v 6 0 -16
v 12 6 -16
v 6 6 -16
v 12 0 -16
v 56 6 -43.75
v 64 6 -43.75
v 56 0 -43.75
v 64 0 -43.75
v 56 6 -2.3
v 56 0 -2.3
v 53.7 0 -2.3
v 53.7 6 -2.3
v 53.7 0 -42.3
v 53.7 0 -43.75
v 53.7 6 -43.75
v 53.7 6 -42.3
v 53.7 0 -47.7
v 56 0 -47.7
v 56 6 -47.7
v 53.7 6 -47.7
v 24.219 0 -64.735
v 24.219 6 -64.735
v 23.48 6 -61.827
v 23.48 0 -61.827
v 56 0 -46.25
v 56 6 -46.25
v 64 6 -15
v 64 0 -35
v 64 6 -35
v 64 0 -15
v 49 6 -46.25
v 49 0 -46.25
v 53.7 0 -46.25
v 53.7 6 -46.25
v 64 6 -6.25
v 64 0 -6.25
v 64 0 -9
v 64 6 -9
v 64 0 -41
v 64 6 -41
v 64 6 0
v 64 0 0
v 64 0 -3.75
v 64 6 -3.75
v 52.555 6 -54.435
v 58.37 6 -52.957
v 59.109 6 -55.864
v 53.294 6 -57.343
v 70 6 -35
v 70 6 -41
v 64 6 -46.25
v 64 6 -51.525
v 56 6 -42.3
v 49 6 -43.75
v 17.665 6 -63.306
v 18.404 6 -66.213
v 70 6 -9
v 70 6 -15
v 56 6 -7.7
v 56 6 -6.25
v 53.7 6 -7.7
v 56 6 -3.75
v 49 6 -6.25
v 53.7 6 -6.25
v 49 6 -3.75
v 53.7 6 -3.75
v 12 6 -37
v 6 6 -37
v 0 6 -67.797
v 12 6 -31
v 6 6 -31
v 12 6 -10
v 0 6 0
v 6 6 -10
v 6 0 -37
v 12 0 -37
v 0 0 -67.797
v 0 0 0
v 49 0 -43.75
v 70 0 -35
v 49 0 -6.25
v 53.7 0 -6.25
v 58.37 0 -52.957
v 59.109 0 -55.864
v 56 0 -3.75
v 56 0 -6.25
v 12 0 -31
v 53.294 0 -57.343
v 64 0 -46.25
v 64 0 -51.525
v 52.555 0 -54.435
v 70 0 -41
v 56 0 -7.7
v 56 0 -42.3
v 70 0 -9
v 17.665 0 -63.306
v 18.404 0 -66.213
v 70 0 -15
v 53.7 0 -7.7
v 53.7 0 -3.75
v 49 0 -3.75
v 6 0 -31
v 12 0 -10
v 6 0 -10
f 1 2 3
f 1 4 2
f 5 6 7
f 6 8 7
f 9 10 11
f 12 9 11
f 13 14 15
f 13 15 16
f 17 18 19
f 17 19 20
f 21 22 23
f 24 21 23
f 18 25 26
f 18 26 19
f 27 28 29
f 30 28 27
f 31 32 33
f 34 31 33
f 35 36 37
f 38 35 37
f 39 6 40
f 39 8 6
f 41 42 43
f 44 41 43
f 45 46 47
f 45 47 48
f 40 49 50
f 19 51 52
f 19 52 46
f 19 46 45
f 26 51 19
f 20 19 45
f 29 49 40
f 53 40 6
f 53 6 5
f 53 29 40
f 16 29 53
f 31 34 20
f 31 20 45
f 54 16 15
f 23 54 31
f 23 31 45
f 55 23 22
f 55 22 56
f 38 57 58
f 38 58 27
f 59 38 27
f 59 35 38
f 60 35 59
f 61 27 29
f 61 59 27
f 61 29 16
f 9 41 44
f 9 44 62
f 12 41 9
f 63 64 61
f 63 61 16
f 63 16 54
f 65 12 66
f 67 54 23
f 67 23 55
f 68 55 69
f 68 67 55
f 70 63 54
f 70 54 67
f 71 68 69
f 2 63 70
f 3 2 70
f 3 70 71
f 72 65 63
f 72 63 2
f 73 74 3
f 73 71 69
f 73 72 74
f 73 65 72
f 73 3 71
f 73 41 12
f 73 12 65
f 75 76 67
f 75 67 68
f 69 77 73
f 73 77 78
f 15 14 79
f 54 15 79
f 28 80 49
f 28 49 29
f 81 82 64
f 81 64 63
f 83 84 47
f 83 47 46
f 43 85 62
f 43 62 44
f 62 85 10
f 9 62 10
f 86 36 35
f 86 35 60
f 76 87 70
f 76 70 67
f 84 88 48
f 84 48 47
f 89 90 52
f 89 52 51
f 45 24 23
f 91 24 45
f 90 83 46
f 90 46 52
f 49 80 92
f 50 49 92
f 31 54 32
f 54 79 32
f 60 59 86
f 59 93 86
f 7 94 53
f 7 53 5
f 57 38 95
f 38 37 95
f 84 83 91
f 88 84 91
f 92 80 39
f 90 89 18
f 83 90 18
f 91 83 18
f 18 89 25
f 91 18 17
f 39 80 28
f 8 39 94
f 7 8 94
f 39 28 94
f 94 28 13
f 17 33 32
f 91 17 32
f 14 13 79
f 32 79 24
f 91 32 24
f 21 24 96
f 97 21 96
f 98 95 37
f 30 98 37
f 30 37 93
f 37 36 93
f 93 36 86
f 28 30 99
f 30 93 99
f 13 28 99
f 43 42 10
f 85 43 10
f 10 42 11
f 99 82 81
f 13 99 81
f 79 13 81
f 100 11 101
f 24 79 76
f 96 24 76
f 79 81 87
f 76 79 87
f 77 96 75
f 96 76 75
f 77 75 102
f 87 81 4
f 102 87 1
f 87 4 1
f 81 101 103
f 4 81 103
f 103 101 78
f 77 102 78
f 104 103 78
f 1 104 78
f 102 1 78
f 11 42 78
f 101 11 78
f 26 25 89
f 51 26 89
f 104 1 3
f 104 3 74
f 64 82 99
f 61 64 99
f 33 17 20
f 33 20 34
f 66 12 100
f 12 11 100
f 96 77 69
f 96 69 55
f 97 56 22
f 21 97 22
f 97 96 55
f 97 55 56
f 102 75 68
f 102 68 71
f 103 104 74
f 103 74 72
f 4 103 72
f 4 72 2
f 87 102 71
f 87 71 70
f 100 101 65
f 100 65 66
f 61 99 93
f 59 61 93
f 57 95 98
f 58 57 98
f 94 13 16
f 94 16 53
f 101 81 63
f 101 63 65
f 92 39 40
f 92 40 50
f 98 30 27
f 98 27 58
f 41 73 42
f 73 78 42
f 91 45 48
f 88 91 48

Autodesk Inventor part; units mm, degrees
ref_plane "YZ Plane" through (0, 0, 0) normal (1, 0, 0) x (0, 1, 0)
ref_plane "XZ Plane" through (0, 0, 0) normal (0, 1, 0) x (-1, 0, 0)
ref_plane "XY Plane" through (0, 0, 0) normal (0, 0, 1) x (1, 0, 0)
sketch "Sketch1" plane through (0, 0, 0) normal (0, 1, 0) x (-1, 0, 0)
  line L0 (0, 0) -> (-70, 0)
  line L1 (-70, 0) -> (-70, -50)
  line L2 (-70, -50) -> (0, -50)
  line L3 (0, -50) -> (0, 0)
  line L4 (0, -50) -> (0, -67.7966)
  line L5 (0, -67.7966) -> (-70, -50)
  dimension "d0" = 70
  dimension "d1" = 50
  dimension "d45" = 14.264
extrude "Extrusion1" add sketch "Sketch1" along normal blind 6
sketch "Sketch2" plane through (0, 6, 0) normal (0, 1, 0) x (1, 0, 0)
  line L0 (70, 50) -> (58.37, 52.9568) construction
  line L1 (70, 50) -> (0, 67.7966) construction
  line L2 (58.37, 52.9568) -> (52.555, 54.4352)
  line L3 (52.555, 54.4352) -> (53.2942, 57.3427)
  line L4 (53.2942, 57.3427) -> (59.1092, 55.8643)
  line L5 (59.1092, 55.8643) -> (58.37, 52.9568)
  line L6 (23.4799, 61.8271) -> (17.6649, 63.3055)
  line L7 (17.6649, 63.3055) -> (18.4041, 66.213)
  line L8 (18.4041, 66.213) -> (24.2191, 64.7346)
  line L9 (24.2191, 64.7346) -> (23.4799, 61.8271)
  point P0 (0, 0)
  dimension "d9" = 12
  dimension "d10" = 6
  dimension "d11" = 3
  dimension "d15" = 6
  dimension "d16" = 3
  dimension "d17" = 30
extrude "Extrusion2" add sketch "Sketch2" against normal blind 6
sketch "Sketch3" plane through (0, 6, 0) normal (0, 1, 0) x (1, 0, 0)
  line L0 (70, 0) -> (70, 50) projected
  line L1 (70, 54) -> (64, 54)
  line L2 (64, 54) -> (64, 41)
  line L3 (64, 41) -> (70, 41)
  line L4 (70, 41) -> (70, 54)
  line L5 (70, 0) -> (64, 0)
  line L6 (64, 0) -> (64, 9)
  line L7 (64, 9) -> (70, 9)
  line L8 (70, 9) -> (70, 0)
  line L9 (70, 35) -> (64, 35)
  line L10 (64, 35) -> (64, 15)
  line L11 (64, 15) -> (70, 15)
  line L12 (70, 15) -> (70, 35)
  point P0 (0, 0)
  dimension "d18" = 6
  dimension "d20" = 6
  dimension "d21" = 9
  dimension "d22" = 6
  dimension "d23" = 6
  dimension "d27" = 20
  dimension "d36" = 13
extrude "Extrusion3" cut sketch "Sketch3" along normal through all both and the other way through all
sketch "Sketch4" plane through (0, 6, 0) normal (0, 1, 0) x (1, 0, 0)
  line L0 (64, 0) -> (64, 9) projected
  line L1 (64, 6.25) -> (56, 6.25)
  line L2 (49, 6.25) -> (49, 3.75)
  line L3 (49, 3.75) -> (53.7, 3.75)
  line L4 (64, 3.75) -> (64, 6.25)
  line L5 (64, 9) -> (70, 9) projected
  line L6 (64, 43.75) -> (56, 43.75)
  line L7 (49, 43.75) -> (49, 46.25)
  line L8 (49, 46.25) -> (53.7, 46.25)
  line L9 (64, 46.25) -> (64, 43.75)
  line L10 (70, 41) -> (64, 41) projected
  line L11 (64, 41) -> (64, 51.5254) projected
  line L12 (56, 47.7) -> (53.7, 47.7)
  line L13 (53.7, 47.7) -> (53.7, 46.25)
  line L14 (53.7, 42.3) -> (56, 42.3)
  line L15 (56, 42.3) -> (56, 43.75)
  line L16 (53.7, 7.7) -> (56, 7.7)
  line L17 (56, 7.7) -> (56, 6.25)
  line L18 (56, 2.3) -> (53.7, 2.3)
  line L19 (53.7, 2.3) -> (53.7, 3.75)
  line L20 (53.7, 6.25) -> (53.7, 7.7)
  line L21 (53.7, 3.75) -> (53.7, 6.25) construction
  line L22 (56, 6.25) -> (56, 3.75) construction
  line L23 (56, 3.75) -> (56, 2.3)
  line L24 (56, 3.75) -> (64, 3.75)
  line L25 (53.7, 3.75) -> (56, 3.75) construction
  line L26 (56, 6.25) -> (53.7, 6.25) construction
  line L27 (53.7, 6.25) -> (49, 6.25)
  line L28 (53.7, 43.75) -> (53.7, 42.3)
  line L29 (53.7, 46.25) -> (53.7, 43.75) construction
  line L30 (53.7, 43.75) -> (49, 43.75)
  line L31 (56, 43.75) -> (53.7, 43.75) construction
  line L32 (56, 46.25) -> (56, 47.7)
  line L33 (56, 43.75) -> (56, 46.25) construction
  line L34 (53.7, 46.25) -> (56, 46.25) construction
  line L35 (56, 46.25) -> (64, 46.25)
  line L36 (6, 10) -> (12, 10)
  line L37 (12, 10) -> (12, 16)
  line L38 (12, 16) -> (6, 16)
  line L39 (6, 16) -> (6, 10)
  line L40 (6, 31) -> (12, 31)
  line L41 (12, 31) -> (12, 37)
  line L42 (12, 37) -> (6, 37)
  line L43 (6, 37) -> (6, 31)
  line L44 (0, 0) -> (64, 0) projected
  line L45 (0, 67.7966) -> (0, 0) projected
  point P0 (64, 45)
  dimension "d37" = 15
  dimension "d38" = 2.5
  dimension "d42" = 15
  dimension "d43" = 2.5
  dimension "d44" = 2.75
  dimension "d46" = 2.75
  dimension "d47" = 5.4
  dimension "d48" = 2.3
  dimension "d49" = 5.4
  dimension "d50" = 8
  dimension "d51" = 8
  dimension "d52" = 6
  dimension "d53" = 6
  dimension "d54" = 6
  dimension "d55" = 6
  dimension "d56" = 10
  dimension "d57" = 6
  dimension "d58" = 15
extrude "Extrusion4" cut sketch "Sketch4" along normal through all both and the other way through all
equation "\"d15\" = d10"
equation "\"d16\" = d11"
equation "\"d18\" = d20"
equation "\"d42\" = d37"
equation "\"d43\" = d38"
equation "\"d44\" = d46"
equation "\"d50\" = d51"
equation "\"d54\" = d52"
properties part number "pinball-case-left-wal-scaledl"
